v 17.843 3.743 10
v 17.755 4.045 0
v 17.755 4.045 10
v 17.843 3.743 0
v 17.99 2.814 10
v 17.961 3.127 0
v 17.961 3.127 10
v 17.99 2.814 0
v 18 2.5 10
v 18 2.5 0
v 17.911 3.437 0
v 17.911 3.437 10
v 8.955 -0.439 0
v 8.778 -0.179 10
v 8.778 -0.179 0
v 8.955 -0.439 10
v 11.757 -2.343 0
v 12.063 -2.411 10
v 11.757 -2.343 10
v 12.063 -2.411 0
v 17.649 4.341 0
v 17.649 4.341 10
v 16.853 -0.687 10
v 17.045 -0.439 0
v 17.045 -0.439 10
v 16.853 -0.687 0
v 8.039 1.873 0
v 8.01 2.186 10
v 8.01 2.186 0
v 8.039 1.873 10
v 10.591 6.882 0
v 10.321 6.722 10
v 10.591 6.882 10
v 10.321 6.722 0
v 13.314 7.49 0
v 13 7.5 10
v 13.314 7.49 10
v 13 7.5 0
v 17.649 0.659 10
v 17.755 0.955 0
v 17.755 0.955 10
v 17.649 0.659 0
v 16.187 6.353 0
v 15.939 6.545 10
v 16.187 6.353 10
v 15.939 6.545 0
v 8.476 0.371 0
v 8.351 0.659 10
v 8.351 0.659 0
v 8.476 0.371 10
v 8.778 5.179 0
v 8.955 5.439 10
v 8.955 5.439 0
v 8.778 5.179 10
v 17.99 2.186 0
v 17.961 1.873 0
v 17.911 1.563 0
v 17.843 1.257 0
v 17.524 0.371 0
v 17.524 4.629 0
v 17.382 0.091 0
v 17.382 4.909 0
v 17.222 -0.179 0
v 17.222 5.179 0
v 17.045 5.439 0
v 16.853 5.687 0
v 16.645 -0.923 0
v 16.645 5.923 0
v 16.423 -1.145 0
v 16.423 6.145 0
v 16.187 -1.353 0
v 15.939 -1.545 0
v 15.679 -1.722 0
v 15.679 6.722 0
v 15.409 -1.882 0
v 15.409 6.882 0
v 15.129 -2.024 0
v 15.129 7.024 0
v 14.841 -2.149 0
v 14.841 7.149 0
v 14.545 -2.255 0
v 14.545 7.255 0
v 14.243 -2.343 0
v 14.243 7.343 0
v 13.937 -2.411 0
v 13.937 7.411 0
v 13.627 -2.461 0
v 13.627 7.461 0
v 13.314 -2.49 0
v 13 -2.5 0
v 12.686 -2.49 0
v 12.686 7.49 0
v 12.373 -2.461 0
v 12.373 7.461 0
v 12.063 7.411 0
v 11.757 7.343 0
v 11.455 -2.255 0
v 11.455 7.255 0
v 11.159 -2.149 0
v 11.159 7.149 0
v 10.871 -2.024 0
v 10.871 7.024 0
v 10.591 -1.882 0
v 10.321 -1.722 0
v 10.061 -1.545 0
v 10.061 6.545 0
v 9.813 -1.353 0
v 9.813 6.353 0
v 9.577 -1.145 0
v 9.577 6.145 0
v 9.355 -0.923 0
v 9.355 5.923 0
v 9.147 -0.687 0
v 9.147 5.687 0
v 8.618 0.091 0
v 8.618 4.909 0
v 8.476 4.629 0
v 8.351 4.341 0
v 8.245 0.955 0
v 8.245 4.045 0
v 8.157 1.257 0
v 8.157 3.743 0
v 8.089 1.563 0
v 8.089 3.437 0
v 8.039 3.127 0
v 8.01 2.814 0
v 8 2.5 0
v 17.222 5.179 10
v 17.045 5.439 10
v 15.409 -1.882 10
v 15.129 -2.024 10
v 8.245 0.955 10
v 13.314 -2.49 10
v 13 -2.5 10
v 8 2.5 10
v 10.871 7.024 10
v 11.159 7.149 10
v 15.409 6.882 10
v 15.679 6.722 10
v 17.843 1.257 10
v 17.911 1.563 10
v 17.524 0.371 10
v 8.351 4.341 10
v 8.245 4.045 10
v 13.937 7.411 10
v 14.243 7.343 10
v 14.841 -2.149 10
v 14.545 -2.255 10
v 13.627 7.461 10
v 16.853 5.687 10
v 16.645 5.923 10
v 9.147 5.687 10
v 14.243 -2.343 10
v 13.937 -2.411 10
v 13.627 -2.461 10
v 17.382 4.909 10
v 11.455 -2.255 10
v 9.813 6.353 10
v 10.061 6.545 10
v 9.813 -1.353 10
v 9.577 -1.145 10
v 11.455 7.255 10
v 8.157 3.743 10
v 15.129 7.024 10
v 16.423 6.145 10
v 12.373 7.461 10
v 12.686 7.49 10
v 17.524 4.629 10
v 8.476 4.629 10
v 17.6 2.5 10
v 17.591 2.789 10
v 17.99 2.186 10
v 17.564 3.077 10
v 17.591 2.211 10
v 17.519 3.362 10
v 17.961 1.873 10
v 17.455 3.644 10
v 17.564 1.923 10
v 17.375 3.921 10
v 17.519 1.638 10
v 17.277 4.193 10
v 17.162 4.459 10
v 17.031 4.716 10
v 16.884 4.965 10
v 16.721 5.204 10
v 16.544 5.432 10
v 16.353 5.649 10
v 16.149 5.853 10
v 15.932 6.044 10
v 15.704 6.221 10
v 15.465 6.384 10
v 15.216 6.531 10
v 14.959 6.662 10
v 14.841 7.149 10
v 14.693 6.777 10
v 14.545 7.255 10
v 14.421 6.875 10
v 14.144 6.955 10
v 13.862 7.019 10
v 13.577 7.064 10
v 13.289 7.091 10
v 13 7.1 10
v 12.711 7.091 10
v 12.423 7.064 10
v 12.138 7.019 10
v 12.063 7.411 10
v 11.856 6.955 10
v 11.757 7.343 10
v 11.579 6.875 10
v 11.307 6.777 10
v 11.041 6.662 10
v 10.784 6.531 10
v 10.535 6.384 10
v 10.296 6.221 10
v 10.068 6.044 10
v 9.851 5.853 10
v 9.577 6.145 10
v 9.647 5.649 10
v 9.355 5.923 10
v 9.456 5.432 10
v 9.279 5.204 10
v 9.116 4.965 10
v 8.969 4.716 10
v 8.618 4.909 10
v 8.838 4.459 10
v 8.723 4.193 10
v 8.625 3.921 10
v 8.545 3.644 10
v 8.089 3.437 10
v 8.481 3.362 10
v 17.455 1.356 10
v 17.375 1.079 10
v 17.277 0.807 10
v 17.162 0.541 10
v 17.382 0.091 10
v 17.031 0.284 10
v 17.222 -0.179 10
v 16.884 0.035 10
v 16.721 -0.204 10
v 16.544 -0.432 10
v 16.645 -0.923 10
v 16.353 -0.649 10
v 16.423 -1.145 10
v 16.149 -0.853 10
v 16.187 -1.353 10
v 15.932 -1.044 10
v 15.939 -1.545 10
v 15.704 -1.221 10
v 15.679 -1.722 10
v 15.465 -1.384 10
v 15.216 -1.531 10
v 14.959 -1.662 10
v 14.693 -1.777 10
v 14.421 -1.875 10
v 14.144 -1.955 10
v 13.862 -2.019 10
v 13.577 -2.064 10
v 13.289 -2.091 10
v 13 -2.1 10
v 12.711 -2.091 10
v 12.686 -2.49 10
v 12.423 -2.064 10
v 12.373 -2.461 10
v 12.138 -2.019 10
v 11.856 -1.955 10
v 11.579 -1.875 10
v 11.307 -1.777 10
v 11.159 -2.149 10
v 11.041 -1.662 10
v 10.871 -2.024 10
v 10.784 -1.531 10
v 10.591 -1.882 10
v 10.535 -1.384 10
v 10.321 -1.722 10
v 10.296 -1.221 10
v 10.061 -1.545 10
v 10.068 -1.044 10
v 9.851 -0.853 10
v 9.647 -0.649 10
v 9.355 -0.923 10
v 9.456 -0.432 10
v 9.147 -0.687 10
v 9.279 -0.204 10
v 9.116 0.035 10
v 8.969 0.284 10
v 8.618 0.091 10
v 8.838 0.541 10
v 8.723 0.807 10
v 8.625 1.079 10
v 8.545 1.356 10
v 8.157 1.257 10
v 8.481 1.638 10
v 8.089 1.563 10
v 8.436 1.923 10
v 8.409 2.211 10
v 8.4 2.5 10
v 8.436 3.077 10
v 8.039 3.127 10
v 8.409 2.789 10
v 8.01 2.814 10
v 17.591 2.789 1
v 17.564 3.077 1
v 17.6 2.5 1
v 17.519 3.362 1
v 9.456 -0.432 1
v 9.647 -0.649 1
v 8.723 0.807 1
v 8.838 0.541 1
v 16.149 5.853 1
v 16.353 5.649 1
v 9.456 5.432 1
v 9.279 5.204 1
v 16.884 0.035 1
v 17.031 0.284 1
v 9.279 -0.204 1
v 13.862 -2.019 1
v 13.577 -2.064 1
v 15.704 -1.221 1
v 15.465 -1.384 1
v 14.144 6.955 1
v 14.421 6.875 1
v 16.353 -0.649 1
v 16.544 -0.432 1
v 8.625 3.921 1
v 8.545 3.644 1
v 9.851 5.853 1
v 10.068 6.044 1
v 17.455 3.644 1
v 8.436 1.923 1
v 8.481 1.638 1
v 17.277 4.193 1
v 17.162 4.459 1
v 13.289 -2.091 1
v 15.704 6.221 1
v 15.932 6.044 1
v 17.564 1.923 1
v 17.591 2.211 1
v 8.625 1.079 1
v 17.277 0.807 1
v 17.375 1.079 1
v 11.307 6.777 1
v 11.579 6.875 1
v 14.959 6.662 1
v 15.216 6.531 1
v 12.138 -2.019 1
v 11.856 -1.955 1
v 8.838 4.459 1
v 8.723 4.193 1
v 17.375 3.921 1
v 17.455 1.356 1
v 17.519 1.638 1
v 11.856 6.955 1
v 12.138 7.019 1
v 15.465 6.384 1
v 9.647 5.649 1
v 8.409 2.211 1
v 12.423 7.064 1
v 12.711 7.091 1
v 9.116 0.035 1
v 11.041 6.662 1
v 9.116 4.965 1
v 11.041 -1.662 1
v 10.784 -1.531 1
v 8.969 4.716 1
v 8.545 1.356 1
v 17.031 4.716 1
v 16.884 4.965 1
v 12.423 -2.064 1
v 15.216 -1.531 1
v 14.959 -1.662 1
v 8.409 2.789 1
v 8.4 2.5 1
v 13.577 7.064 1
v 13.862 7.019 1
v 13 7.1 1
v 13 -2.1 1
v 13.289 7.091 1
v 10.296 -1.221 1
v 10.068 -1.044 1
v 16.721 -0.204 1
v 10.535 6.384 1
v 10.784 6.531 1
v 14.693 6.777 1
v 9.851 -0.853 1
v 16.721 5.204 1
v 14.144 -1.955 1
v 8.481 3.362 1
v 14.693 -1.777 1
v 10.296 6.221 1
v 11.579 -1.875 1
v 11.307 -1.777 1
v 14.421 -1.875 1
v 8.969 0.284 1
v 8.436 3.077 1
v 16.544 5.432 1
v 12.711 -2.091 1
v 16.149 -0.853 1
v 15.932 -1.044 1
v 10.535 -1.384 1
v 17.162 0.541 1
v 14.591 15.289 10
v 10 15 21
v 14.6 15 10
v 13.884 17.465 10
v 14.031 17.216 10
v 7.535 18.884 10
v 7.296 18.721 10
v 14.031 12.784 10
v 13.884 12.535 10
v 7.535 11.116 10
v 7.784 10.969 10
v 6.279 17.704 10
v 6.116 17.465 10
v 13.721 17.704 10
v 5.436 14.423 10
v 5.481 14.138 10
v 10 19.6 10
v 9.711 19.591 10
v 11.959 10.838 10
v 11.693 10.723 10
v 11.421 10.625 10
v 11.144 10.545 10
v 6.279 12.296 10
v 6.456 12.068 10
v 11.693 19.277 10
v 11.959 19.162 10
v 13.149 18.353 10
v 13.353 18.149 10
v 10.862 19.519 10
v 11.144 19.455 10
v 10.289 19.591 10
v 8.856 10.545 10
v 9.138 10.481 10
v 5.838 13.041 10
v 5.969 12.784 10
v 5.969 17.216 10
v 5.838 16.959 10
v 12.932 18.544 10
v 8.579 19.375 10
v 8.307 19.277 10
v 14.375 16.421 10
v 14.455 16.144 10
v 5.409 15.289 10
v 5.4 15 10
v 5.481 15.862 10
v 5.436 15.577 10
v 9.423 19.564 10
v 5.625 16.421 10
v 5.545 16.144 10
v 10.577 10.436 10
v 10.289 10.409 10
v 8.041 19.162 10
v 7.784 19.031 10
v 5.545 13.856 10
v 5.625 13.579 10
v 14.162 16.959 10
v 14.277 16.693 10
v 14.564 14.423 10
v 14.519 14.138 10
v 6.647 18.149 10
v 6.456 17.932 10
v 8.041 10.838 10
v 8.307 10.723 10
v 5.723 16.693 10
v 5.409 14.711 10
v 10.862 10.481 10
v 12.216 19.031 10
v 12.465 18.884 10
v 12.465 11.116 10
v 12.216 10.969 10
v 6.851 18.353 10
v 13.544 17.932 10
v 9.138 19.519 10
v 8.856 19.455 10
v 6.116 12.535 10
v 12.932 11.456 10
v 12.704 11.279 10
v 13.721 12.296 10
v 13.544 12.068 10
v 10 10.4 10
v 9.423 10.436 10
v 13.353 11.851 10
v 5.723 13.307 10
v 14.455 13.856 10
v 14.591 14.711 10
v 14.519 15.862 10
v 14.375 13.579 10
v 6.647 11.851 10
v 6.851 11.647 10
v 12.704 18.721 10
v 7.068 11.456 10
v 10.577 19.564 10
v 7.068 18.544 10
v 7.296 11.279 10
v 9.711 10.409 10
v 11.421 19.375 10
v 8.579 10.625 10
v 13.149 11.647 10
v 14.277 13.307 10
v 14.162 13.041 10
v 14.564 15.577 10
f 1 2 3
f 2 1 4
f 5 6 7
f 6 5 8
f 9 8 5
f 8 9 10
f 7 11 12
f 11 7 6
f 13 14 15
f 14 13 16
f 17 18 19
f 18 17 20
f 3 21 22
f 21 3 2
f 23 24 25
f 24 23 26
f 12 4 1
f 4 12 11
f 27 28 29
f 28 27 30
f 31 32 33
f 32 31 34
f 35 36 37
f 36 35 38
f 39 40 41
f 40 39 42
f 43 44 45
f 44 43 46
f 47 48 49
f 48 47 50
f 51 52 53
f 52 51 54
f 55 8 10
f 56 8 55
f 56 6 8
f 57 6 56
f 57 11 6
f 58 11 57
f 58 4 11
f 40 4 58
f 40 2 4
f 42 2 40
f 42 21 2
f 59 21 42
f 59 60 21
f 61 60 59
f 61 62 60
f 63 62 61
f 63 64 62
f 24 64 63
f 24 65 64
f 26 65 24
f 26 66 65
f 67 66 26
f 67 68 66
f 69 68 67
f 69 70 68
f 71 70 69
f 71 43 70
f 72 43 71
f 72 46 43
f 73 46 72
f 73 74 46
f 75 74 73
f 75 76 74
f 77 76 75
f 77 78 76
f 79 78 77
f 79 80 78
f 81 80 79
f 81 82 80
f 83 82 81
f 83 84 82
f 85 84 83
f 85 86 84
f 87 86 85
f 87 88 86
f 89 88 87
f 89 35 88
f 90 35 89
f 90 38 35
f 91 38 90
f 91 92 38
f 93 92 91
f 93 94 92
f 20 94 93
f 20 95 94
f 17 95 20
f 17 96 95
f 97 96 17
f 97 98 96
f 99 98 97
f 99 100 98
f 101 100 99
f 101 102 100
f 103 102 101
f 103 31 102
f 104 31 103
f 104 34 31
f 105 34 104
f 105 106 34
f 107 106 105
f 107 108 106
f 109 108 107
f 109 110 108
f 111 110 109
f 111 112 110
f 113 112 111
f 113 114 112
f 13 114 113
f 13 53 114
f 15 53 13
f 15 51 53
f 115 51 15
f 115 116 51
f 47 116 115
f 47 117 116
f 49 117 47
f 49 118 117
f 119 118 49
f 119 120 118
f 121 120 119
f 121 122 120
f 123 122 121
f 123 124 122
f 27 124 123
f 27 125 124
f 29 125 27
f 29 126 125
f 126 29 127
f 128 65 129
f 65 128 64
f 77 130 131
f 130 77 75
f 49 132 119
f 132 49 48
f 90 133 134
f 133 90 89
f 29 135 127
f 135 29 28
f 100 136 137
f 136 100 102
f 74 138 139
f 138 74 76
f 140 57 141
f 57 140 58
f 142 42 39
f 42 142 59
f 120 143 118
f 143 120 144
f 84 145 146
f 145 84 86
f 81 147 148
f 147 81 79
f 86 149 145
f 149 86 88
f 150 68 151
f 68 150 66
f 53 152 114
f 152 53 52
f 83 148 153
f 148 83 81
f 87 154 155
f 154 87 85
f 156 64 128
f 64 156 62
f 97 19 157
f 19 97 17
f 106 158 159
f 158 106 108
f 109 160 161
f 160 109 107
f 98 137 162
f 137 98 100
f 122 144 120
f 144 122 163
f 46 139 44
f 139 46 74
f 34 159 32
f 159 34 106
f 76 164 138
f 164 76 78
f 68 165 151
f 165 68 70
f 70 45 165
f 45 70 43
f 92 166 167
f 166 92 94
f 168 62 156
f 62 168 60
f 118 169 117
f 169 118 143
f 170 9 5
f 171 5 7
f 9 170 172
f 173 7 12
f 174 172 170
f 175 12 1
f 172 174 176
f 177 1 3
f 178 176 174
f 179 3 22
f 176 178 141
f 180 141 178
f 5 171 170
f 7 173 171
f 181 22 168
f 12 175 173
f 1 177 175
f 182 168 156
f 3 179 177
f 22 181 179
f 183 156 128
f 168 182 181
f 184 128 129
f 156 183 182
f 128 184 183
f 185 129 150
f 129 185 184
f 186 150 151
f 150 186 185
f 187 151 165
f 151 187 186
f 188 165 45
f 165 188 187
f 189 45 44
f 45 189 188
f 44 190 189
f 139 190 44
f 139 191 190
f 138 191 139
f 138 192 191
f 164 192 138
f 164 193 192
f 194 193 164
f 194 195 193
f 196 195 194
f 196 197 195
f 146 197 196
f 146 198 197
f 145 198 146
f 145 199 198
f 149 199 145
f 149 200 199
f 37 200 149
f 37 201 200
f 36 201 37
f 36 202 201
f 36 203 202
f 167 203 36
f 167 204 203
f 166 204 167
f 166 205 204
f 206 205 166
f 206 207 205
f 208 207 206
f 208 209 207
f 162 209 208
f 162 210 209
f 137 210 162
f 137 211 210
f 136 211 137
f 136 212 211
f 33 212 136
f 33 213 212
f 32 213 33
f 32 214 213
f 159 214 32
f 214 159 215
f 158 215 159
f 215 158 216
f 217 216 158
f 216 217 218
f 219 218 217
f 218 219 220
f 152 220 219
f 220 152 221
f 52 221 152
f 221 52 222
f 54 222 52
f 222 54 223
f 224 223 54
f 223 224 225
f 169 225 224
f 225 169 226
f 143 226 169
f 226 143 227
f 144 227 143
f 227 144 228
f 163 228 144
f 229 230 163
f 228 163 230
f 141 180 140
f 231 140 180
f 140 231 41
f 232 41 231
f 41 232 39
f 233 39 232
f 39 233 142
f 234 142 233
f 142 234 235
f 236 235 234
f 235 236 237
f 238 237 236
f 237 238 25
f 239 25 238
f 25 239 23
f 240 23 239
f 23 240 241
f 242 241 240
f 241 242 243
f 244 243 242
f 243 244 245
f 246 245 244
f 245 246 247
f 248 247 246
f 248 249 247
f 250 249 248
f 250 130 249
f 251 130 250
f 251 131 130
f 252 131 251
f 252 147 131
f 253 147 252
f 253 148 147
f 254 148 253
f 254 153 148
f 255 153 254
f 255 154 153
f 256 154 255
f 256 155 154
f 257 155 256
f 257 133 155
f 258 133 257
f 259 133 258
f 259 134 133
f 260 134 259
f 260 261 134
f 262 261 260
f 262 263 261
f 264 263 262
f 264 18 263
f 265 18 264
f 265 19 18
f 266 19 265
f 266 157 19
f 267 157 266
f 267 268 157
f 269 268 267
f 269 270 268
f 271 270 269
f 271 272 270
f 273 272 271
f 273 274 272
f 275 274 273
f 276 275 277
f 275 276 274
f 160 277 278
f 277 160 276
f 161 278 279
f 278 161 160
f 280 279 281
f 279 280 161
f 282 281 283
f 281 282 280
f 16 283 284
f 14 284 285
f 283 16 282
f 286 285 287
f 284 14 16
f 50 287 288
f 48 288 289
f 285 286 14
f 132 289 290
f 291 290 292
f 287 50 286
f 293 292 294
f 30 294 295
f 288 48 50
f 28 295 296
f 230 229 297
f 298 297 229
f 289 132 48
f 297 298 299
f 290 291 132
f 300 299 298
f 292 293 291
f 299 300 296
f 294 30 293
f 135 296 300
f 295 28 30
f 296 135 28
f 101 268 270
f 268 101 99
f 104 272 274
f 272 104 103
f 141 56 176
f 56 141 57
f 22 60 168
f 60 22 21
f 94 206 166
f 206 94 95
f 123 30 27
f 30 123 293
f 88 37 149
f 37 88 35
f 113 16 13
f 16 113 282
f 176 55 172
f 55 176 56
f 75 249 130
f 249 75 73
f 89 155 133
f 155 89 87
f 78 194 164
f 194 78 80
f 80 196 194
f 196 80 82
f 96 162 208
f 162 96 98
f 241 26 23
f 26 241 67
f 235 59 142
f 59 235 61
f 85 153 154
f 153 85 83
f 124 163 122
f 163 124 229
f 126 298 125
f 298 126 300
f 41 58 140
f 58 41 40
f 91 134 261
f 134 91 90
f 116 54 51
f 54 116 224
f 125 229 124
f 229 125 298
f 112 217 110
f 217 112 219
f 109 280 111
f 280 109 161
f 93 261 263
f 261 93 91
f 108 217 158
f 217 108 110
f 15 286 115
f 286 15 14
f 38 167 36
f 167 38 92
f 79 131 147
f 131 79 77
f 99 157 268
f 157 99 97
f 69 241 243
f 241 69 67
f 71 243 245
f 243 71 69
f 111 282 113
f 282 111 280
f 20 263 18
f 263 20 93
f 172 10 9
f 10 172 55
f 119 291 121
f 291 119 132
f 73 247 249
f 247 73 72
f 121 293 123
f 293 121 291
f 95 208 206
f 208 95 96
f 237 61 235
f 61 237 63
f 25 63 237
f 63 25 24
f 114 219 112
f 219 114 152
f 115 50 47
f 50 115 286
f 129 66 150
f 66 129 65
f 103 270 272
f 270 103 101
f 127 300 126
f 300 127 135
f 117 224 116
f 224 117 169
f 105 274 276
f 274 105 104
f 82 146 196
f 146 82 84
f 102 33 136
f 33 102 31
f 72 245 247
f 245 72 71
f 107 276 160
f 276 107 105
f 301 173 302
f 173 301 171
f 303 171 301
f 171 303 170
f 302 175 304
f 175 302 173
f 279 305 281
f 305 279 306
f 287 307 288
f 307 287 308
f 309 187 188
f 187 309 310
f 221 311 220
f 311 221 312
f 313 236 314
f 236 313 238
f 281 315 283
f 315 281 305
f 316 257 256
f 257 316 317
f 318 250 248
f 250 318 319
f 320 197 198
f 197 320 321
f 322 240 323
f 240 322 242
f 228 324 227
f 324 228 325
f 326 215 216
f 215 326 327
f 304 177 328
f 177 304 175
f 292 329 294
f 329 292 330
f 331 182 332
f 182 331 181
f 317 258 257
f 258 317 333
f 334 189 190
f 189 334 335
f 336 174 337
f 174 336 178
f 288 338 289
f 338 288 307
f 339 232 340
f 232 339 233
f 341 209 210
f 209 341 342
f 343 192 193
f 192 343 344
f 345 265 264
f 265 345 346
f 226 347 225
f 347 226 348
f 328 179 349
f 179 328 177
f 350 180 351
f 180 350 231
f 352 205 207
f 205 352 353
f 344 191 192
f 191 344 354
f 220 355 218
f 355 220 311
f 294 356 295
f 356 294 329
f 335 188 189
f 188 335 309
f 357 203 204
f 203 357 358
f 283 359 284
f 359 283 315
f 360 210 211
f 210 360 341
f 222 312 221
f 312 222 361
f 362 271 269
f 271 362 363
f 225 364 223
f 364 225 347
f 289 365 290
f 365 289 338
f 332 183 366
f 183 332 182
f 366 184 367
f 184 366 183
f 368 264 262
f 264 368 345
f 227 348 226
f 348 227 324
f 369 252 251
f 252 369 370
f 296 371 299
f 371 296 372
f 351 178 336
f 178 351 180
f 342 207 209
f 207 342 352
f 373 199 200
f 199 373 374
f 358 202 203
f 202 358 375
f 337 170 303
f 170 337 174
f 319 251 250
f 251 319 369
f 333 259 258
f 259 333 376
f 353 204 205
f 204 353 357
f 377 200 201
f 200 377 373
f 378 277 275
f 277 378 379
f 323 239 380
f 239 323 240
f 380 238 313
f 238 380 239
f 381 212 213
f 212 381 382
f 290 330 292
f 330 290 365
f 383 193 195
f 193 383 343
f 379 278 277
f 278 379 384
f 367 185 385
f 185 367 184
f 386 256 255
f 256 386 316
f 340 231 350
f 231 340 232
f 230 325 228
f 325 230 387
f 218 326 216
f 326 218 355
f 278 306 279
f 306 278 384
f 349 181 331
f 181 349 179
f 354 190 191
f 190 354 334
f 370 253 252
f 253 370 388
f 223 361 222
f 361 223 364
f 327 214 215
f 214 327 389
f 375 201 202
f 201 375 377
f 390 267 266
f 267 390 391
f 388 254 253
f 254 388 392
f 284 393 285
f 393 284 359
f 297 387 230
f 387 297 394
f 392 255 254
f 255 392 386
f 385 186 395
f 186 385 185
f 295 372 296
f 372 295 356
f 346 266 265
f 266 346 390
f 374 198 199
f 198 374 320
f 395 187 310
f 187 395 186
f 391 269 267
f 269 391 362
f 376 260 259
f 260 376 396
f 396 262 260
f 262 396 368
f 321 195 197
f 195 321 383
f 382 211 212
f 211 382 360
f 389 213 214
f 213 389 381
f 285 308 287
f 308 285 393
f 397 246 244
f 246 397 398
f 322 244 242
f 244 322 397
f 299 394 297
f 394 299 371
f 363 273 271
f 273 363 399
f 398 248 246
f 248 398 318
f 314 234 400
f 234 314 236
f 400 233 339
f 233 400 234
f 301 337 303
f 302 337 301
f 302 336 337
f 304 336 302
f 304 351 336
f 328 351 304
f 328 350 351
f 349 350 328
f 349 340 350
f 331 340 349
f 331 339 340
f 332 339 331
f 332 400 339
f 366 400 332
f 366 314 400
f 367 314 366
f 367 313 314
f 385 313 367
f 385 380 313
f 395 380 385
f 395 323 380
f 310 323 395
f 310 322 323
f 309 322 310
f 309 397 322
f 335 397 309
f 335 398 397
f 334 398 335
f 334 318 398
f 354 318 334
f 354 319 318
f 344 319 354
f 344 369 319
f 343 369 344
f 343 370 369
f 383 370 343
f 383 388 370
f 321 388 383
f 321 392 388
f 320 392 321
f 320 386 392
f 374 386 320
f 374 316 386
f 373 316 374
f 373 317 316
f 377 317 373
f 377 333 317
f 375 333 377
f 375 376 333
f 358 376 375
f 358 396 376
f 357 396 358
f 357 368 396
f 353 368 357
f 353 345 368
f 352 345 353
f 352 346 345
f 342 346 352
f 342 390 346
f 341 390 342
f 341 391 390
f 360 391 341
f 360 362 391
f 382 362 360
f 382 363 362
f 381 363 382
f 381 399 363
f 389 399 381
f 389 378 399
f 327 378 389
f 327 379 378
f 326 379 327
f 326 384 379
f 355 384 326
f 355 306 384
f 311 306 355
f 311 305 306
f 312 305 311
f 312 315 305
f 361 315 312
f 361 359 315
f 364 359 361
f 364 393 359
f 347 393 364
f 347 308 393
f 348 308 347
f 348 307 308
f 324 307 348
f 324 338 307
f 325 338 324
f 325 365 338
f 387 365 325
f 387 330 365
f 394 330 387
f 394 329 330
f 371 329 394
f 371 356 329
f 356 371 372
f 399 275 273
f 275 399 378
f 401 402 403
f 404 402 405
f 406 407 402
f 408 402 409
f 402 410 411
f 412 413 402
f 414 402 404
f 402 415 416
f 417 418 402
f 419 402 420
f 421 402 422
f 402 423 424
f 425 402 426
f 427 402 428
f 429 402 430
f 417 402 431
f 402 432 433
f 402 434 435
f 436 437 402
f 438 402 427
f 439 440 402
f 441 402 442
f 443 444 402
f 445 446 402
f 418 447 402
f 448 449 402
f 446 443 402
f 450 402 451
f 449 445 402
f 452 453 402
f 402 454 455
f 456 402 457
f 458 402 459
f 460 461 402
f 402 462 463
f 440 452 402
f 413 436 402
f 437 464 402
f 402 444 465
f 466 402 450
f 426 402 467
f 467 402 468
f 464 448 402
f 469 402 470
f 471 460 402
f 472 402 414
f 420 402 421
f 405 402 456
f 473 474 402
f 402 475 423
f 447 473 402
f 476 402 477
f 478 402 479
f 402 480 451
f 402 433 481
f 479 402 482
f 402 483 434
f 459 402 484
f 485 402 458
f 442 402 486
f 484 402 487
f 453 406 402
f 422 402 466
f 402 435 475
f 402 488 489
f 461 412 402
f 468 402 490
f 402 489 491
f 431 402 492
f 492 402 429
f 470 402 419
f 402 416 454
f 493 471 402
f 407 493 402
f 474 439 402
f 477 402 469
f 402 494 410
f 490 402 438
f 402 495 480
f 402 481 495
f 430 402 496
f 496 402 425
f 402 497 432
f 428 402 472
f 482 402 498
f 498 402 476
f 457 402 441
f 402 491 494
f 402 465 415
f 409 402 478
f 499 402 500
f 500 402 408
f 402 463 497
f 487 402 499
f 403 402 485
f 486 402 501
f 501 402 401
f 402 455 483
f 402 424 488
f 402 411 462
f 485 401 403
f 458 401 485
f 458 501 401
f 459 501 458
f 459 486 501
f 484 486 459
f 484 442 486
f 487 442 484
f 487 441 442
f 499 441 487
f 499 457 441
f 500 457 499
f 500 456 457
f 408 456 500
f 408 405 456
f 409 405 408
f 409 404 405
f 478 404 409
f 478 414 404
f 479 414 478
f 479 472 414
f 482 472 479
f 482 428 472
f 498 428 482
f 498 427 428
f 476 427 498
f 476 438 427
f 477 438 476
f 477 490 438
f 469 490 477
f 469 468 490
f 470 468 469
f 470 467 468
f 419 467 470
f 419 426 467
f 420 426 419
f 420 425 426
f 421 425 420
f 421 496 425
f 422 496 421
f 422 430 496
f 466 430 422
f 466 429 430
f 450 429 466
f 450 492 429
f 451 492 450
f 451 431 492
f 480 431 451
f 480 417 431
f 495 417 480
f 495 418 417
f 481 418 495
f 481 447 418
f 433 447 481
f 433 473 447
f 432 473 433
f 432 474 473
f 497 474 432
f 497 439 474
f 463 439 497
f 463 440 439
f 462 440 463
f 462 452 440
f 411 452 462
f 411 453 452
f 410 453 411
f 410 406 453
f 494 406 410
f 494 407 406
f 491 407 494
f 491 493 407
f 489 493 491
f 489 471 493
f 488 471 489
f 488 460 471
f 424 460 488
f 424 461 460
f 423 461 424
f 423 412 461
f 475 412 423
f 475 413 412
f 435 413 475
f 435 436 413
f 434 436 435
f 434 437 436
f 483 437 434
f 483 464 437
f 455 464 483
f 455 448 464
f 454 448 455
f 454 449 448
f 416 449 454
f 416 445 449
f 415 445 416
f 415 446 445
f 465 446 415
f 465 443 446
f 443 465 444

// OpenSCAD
$fn=100;


translate([13,2.5,0]) 
	difference() { 
		cylinder(10,5, 5); 
		translate([0,0,1]) cylinder(11,4.6,4.6); 
	}

translate([10,15,10]) cylinder(11,4.6,0); 
